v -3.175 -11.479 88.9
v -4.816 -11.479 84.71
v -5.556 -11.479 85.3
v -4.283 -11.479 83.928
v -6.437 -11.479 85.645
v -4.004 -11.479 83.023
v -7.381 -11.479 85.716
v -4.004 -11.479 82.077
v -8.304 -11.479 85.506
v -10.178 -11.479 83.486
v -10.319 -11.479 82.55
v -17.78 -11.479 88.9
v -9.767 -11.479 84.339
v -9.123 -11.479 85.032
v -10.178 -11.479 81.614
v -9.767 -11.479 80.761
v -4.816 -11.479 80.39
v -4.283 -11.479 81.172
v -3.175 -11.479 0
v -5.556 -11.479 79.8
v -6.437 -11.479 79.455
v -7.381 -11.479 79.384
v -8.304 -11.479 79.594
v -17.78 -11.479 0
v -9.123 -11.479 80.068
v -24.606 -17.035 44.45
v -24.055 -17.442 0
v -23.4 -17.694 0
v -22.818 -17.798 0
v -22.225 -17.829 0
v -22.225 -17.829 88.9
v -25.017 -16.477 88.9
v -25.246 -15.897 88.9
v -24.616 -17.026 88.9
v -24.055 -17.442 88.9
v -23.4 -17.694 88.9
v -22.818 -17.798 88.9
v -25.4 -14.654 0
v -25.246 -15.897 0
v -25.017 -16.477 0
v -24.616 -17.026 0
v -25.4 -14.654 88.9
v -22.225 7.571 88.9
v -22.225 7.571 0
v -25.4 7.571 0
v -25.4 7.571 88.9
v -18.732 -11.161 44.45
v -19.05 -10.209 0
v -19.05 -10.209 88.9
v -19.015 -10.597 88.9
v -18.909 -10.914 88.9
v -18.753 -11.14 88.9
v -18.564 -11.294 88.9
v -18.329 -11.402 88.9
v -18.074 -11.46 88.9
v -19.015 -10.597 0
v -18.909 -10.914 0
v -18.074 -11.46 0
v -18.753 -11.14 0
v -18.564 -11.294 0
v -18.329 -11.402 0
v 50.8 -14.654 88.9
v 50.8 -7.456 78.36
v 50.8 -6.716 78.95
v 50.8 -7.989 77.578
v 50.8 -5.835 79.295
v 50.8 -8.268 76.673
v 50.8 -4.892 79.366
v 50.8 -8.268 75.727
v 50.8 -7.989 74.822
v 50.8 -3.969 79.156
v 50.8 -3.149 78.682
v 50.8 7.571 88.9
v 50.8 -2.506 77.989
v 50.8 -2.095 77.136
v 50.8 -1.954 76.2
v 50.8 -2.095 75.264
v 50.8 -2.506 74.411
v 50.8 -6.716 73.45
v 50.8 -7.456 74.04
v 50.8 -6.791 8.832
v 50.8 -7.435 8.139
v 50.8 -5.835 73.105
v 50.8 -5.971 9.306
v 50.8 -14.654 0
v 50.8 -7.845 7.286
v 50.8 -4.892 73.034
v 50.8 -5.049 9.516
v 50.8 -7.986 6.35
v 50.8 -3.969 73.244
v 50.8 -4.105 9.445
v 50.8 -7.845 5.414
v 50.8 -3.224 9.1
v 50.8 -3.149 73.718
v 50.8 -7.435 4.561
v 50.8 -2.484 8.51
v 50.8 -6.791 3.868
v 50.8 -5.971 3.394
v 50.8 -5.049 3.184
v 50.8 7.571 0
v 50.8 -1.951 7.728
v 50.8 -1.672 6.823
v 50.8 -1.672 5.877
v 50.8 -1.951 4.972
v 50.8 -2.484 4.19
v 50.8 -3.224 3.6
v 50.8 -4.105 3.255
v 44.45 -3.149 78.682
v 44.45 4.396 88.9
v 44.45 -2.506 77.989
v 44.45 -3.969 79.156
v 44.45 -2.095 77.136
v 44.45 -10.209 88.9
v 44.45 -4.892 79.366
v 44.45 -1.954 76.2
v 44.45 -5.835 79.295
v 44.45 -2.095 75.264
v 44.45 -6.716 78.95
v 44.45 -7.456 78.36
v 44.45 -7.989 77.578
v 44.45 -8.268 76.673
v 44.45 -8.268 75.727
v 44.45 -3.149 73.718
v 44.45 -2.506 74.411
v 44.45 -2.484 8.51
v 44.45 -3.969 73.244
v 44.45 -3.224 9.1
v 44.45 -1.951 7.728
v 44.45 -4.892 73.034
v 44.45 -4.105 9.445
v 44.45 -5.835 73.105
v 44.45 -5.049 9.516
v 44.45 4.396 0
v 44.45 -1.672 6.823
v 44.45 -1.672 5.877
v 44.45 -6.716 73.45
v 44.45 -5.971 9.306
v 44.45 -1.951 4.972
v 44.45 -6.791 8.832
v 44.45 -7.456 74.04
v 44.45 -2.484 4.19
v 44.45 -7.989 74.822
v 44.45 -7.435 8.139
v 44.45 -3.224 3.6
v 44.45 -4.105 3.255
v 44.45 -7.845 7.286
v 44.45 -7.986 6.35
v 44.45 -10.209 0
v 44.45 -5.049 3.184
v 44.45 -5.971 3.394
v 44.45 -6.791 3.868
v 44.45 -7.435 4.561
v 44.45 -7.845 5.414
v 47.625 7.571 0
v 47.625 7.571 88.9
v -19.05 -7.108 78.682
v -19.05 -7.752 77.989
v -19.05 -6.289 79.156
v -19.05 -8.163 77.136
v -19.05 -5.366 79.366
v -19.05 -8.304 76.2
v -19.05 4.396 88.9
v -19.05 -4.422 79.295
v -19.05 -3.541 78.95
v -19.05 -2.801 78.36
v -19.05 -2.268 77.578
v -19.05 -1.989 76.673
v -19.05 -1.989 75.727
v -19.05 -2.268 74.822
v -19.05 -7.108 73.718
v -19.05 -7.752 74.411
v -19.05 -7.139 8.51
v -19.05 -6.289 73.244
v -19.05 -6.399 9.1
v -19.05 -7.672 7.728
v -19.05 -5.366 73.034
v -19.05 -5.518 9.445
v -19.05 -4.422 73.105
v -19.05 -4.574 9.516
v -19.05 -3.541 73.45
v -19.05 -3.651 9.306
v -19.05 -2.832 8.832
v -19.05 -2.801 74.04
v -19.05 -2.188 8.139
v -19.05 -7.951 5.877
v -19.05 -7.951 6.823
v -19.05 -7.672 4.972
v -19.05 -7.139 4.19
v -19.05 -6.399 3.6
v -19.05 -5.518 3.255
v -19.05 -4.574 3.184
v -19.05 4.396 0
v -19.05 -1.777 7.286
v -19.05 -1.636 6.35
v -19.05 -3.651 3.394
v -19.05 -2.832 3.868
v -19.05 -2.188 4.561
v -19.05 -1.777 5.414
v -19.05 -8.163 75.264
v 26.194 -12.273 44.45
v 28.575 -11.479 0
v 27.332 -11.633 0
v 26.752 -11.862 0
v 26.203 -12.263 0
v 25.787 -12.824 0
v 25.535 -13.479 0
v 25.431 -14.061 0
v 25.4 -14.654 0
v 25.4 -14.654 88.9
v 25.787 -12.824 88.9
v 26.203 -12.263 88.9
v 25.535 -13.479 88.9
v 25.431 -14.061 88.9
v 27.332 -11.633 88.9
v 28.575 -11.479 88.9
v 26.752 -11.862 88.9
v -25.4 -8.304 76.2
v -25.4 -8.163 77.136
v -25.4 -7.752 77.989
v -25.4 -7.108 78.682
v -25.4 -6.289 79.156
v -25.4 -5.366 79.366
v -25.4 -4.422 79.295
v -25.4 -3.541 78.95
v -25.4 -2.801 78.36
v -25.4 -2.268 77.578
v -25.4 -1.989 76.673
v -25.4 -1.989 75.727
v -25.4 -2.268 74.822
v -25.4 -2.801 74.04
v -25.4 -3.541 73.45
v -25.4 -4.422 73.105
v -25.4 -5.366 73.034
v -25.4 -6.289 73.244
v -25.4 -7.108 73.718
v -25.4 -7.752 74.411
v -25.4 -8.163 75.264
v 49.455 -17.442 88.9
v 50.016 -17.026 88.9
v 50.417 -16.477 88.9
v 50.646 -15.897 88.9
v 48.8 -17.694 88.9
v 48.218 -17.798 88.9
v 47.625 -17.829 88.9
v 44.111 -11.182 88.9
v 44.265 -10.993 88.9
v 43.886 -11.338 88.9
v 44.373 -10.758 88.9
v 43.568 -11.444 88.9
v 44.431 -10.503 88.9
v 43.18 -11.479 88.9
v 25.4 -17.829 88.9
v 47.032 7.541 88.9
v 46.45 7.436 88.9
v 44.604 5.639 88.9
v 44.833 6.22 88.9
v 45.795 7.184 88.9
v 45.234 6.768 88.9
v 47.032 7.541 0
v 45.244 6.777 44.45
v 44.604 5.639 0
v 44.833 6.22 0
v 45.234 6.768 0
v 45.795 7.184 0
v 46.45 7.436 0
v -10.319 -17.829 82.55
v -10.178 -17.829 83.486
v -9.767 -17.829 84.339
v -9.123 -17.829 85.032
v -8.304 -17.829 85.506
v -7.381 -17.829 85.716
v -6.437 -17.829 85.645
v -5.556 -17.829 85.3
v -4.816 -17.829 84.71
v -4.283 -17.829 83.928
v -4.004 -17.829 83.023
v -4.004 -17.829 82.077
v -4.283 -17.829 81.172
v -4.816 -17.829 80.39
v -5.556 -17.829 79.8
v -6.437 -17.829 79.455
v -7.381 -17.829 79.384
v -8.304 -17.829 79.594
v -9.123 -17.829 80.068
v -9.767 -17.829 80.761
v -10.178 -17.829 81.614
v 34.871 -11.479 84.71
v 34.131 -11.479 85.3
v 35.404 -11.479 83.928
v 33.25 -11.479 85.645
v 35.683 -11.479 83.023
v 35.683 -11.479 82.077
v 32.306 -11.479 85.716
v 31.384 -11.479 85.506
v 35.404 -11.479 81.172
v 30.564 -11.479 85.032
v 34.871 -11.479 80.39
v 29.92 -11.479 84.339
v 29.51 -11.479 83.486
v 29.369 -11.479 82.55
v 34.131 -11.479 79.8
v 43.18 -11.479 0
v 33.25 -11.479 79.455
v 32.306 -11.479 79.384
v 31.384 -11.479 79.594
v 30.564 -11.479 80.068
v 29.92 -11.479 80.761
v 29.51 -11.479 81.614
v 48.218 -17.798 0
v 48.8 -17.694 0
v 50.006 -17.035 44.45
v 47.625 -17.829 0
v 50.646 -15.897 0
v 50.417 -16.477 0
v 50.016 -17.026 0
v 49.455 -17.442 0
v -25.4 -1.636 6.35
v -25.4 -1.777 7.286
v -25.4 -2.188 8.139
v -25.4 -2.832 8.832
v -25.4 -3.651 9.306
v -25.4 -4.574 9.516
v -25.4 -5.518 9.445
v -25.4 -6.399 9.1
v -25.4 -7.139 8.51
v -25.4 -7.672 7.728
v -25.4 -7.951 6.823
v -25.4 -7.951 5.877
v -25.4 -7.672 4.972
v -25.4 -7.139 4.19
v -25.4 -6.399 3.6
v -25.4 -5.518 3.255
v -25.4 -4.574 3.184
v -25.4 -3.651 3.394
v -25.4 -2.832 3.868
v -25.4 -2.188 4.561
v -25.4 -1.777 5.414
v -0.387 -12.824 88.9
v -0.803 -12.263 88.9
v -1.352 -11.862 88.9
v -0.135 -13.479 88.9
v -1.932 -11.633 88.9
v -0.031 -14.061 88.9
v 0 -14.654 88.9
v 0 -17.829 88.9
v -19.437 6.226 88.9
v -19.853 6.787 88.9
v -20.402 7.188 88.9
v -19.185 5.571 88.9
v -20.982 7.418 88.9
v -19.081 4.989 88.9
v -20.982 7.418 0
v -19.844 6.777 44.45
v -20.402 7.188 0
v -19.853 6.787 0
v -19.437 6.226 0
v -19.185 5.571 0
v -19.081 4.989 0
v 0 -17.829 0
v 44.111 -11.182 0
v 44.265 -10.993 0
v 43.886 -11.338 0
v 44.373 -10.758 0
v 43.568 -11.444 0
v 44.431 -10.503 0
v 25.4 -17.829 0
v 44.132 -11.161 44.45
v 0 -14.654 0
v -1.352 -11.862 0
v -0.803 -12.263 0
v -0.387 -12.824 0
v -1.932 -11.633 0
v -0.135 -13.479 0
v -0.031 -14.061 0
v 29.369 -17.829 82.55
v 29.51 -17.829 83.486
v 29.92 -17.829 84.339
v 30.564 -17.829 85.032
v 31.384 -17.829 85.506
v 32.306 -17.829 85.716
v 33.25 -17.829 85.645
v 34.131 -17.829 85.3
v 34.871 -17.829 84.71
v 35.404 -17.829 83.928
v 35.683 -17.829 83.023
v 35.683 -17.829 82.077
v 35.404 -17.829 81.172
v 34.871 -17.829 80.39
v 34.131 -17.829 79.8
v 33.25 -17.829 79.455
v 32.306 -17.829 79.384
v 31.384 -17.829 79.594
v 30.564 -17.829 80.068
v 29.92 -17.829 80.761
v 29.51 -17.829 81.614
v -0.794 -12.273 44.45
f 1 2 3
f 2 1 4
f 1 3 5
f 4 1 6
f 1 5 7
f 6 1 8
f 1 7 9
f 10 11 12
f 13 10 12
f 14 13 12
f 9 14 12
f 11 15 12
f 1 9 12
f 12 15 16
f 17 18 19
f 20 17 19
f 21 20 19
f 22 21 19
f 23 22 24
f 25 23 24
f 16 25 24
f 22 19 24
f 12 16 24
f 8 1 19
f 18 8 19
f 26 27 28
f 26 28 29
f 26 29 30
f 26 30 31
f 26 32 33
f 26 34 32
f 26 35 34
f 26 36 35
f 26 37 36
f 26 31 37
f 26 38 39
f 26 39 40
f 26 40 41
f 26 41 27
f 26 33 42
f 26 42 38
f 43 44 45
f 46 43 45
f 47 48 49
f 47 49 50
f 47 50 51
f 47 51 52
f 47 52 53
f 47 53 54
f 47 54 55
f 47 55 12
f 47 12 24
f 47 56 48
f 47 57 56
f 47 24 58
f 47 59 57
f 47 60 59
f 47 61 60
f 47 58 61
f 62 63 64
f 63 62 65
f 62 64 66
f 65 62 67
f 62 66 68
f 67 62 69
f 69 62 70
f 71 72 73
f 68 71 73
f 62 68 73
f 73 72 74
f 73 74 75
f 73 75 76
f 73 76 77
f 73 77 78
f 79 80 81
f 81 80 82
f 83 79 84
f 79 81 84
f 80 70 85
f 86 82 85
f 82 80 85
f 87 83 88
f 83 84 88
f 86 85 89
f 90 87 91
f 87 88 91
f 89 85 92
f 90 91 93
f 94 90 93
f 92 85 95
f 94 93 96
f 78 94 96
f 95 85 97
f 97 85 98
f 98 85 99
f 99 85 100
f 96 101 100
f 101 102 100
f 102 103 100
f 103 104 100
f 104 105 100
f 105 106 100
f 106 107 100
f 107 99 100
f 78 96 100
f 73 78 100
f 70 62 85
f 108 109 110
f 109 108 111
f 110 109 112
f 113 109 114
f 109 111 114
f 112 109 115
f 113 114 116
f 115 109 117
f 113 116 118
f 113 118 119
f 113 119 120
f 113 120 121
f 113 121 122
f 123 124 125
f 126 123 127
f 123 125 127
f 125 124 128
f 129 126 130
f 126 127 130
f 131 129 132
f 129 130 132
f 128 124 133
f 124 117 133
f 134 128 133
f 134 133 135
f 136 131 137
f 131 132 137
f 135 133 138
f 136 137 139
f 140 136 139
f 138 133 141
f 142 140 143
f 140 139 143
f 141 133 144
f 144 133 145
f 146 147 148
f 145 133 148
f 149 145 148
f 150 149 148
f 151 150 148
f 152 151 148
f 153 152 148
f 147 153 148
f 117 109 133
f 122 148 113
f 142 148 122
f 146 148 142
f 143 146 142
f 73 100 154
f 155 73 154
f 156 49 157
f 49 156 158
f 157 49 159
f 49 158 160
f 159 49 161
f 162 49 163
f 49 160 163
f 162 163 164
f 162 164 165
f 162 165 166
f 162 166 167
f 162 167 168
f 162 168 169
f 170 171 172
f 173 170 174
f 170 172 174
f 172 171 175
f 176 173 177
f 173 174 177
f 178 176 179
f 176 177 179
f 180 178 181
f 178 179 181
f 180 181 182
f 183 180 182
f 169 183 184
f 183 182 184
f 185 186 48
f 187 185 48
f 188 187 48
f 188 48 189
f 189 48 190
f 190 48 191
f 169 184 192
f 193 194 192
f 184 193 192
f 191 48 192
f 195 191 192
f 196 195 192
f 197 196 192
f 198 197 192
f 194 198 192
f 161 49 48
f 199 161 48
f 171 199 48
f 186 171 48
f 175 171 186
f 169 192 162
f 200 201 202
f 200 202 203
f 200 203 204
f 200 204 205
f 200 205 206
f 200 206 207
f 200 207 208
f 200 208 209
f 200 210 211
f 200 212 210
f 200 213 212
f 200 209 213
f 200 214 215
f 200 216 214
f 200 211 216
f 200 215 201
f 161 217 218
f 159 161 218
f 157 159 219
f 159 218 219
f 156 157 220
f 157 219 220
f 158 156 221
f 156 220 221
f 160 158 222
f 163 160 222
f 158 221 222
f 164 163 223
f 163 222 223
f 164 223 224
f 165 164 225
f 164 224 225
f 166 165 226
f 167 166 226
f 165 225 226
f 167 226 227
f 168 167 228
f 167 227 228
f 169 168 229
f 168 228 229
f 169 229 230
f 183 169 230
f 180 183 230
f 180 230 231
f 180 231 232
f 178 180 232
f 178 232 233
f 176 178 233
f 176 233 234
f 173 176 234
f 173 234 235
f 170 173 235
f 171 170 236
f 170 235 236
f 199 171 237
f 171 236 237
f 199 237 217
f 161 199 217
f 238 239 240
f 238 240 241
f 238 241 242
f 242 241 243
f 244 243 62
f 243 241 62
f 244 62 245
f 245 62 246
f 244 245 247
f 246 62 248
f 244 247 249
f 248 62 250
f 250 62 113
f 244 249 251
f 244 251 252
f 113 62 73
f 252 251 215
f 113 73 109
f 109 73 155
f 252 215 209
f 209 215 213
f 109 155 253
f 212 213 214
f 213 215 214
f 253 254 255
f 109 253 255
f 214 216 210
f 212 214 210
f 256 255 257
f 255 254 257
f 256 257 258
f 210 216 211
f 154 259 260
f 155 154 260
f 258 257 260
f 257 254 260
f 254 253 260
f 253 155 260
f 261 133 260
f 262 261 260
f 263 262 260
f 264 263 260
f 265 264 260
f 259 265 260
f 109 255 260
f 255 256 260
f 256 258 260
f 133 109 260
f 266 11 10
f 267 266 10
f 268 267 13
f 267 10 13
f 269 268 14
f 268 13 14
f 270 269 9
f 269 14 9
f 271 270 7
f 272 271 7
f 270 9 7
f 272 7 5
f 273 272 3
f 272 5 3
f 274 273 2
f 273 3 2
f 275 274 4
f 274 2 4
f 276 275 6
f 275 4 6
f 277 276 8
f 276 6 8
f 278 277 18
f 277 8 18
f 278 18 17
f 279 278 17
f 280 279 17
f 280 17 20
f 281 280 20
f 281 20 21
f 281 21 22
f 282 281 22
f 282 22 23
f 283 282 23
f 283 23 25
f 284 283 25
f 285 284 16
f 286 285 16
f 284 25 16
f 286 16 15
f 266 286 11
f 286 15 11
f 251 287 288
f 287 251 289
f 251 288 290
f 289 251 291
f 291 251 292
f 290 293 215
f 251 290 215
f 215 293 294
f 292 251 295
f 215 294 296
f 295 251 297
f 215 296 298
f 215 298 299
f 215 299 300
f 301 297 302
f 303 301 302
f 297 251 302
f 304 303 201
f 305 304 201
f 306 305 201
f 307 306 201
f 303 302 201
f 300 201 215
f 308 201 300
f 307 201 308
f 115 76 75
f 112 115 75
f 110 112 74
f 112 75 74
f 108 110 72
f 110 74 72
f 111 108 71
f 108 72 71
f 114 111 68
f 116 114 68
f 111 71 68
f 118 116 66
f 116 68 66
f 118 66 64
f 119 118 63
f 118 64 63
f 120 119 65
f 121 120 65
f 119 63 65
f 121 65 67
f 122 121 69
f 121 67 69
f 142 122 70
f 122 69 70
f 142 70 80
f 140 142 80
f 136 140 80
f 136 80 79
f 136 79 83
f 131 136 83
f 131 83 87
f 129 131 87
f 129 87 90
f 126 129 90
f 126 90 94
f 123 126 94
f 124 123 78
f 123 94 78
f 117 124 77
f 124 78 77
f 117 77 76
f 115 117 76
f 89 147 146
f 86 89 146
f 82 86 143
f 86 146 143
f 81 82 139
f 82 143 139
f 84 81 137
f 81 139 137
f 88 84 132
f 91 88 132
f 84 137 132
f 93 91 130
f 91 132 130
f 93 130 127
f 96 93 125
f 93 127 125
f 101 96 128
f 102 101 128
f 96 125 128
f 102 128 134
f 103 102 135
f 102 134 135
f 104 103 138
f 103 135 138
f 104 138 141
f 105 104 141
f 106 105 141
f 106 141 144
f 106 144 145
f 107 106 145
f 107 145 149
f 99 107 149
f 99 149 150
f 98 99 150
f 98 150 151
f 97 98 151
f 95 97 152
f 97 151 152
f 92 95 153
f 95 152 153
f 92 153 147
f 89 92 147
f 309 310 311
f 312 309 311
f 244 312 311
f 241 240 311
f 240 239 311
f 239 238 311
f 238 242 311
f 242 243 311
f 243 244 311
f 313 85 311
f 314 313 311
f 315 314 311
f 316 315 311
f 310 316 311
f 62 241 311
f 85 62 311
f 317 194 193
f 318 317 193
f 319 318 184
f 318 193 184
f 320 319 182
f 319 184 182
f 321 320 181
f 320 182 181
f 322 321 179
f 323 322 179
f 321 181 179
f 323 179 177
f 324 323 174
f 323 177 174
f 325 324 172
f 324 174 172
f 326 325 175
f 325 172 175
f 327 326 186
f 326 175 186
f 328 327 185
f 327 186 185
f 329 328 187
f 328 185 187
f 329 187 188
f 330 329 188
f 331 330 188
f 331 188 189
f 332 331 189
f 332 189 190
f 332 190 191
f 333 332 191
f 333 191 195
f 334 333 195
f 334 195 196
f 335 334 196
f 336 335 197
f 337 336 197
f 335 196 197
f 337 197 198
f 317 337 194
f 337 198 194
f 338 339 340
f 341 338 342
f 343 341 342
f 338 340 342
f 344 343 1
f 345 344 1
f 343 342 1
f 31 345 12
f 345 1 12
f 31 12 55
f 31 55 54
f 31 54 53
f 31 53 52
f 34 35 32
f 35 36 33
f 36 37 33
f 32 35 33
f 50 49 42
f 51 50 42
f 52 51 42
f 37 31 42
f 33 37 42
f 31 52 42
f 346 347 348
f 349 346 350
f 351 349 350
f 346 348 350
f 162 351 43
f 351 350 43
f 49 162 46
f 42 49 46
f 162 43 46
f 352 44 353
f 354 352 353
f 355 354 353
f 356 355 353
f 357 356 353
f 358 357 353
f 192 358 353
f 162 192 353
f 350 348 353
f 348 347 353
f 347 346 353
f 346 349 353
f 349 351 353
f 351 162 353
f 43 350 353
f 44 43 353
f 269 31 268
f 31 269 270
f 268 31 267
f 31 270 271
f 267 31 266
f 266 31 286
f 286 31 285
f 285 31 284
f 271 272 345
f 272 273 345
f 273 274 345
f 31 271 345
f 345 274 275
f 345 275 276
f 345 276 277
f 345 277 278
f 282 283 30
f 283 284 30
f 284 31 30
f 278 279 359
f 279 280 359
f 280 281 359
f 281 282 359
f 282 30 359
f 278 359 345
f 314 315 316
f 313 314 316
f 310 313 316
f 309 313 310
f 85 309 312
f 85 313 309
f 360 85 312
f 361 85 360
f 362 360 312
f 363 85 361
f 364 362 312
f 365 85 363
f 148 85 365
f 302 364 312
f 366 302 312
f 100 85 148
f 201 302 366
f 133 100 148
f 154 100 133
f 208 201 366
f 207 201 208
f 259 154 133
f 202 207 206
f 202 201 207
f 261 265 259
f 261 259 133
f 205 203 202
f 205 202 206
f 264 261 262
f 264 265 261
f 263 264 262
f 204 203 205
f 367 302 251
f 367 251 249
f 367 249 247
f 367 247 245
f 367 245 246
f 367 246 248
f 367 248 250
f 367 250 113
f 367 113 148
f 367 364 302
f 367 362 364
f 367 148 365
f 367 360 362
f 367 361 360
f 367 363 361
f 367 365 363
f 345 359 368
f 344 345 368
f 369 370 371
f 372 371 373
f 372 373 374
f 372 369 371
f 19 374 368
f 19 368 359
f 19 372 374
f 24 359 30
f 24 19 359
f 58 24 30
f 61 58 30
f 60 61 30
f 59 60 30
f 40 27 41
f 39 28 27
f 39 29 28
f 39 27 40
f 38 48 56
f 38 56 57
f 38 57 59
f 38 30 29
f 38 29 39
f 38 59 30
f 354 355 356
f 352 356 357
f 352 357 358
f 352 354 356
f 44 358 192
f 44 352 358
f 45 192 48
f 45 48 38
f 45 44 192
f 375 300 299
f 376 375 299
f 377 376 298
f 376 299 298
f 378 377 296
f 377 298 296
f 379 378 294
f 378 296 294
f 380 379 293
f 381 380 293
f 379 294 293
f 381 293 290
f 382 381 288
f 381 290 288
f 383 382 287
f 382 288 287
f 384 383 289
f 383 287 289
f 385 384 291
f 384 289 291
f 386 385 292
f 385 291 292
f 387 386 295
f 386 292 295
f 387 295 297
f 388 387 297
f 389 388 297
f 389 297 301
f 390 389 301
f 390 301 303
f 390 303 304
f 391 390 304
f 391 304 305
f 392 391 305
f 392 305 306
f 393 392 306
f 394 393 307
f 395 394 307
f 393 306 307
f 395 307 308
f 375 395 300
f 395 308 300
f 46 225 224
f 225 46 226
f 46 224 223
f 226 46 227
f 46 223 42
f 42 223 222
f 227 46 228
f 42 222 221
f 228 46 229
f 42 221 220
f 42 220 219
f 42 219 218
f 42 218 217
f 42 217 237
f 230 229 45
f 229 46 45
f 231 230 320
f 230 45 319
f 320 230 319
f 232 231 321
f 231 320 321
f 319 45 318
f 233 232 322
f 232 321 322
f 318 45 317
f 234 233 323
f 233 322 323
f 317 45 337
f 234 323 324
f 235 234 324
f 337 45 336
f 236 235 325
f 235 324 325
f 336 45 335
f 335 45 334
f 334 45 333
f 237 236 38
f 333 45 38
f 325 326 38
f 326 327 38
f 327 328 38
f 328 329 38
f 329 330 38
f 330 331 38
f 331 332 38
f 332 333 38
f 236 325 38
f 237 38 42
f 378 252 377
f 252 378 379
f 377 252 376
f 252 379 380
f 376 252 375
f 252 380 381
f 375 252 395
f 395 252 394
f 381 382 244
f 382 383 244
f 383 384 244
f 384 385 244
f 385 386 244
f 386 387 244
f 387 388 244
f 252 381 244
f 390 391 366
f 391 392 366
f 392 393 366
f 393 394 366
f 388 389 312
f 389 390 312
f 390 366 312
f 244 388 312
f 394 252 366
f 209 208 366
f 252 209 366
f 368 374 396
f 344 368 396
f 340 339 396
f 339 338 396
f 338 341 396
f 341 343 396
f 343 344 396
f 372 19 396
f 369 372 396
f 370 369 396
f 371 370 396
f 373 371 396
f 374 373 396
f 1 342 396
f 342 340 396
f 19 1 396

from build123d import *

# Parameters (mm, degrees)
F1_DEPTH      = 88.9
F2_T1_DEPTH   = 104.775
F3_T1_DEPTH   = 104.775
F5_DEPTH      = 88.9
F6_T1_DEPTH   = 104.775
F7_T1_DEPTH   = 88.9
F7_2_T1_DEPTH = 88.9
F8_T1_DEPTH   = 104.775
F10_R         = 3.175
F11_DEPTH     = 6.35
F9_R          = 3.175
F12_DEPTH     = 6.35
F14_R         = 3.175
F15_DEPTH     = 6.35
F13_R         = 3.175
F16_DEPTH     = 6.35
F17_R         = 3.175
F19_DEPTH     = 6.35
F18_R         = 3.175
F20_DEPTH     = 6.35


# Not quite as in the source:
# - a fillet or chamfer that OpenCascade refuses, or shapes differently, is made with other operations: its cross-section is extruded or revolved along the edge and cut away or added


with BuildPart() as f1:
    # F0 (on Top) → F1 (new body)
    with BuildSketch(Plane.XY):
        Polygon((-19.05, -11.4788501549), (-19.05, 7.5711498451), (-25.4, 7.5711498451), (-25.4, -17.8288501549), (0, -17.8288501549), (0, -11.4788501549), align=None)
    extrude(amount=F1_DEPTH)

    # F2: fillet of radius 3.175 on 2 edges, made by hand

    # F2_s2 → F2_t1 (cut)
    with BuildSketch(Plane.XY.offset(-7.9375)):
        with BuildLine():
            add(Edge.make_bspline(
                [(-19.05, 4.3961498451), (-19.05, 7.5711498451), (-22.225, 7.5711498451)],
                knots=[0, 0, 0, 1, 1, 1], degree=2, weights=[1, 1, 1]))
            Line((-22.225, 7.5711498451), (-19.05, 7.5711498451))
            Line((-19.05, 7.5711498451), (-19.05, 4.3961498451))
        make_face()
        with BuildLine():
            add(Edge.make_bspline(
                [(0, -14.6538501549), (0, -11.4788501549), (-3.175, -11.4788501549)],
                knots=[0, 0, 0, 1, 1, 1], degree=2, weights=[1, 1, 1]))
            Line((-3.175, -11.4788501549), (0, -11.4788501549))
            Line((0, -11.4788501549), (0, -14.6538501549))
        make_face()
    extrude(amount=F2_T1_DEPTH, mode=Mode.SUBTRACT)

    # F3: fillet of radius 3.175 on 1 edges, made by hand

    # F3_s2 → F3_t1 (cut)
    with BuildSketch(Plane.XY.offset(-7.9375)):
        with BuildLine():
            add(Edge.make_bspline(
                [(-22.225, -17.8288501549), (-25.4, -17.8288501549), (-25.4, -14.6538501549)],
                knots=[0, 0, 0, 1, 1, 1], degree=2, weights=[1, 1, 1]))
            Line((-25.4, -14.6538501549), (-25.4, -17.8288501549))
            Line((-25.4, -17.8288501549), (-22.225, -17.8288501549))
        make_face()
    extrude(amount=F3_T1_DEPTH, mode=Mode.SUBTRACT)

    # F7#2: fillet of radius 1.27 on 1 edges, made by hand

    # F7_2_s2 → F7_2_t1 (join)
    with BuildSketch(Plane.XY):
        with BuildLine():
            add(Edge.make_bspline(
                [(-19.05, -10.2088501549), (-19.05, -11.4788501549), (-17.78, -11.4788501549)],
                knots=[0, 0, 0, 1, 1, 1], degree=2, weights=[1, 1, 1]))
            Line((-17.78, -11.4788501549), (-19.05, -11.4788501549))
            Line((-19.05, -11.4788501549), (-19.05, -10.2088501549))
        make_face()
    extrude(amount=F7_2_T1_DEPTH)

    # F9 (on face) → F12 (cut)
    with BuildSketch(Plane.YZ.offset(-19.05)):
        with Locations((-4.8113501549, 6.35)):
            Circle(F9_R)
    extrude(amount=-F12_DEPTH, mode=Mode.SUBTRACT)

    # F14 (on face) → F15 (cut)
    with BuildSketch(Plane(origin=(-25.4, 0, 0), x_dir=(0, -1, 0), z_dir=(-1, 0, 0))):
        with Locations((5.1288501549, 76.2)):
            Circle(F14_R)
    extrude(amount=-F15_DEPTH, mode=Mode.SUBTRACT)

    # F18 (on face) → F20 (cut)
    with BuildSketch(Plane(origin=(0, -11.4788501549, 0), x_dir=(-1, 0, 0), z_dir=(0, 1, 0))):
        with Locations((7.14375, 82.55)):
            Circle(F18_R)
    extrude(amount=-F20_DEPTH, mode=Mode.SUBTRACT)


with BuildPart() as f5:
    # F4 (on Top) → F5 (new body)
    with BuildSketch(Plane.XY):
        Polygon((25.4, -11.4788501549), (25.4, -17.8288501549), (50.8, -17.8288501549), (50.8, 7.5711498451), (44.45, 7.5711498451), (44.45, -11.4788501549), align=None)
    extrude(amount=F5_DEPTH)

    # F6: fillet of radius 3.175 on 2 edges, made by hand

    # F6_s2 → F6_t1 (cut)
    with BuildSketch(Plane.XY.offset(-7.9375)):
        with BuildLine():
            add(Edge.make_bspline(
                [(25.4, -14.6538501549), (25.4, -11.4788501549), (28.575, -11.4788501549)],
                knots=[0, 0, 0, 1, 1, 1], degree=2, weights=[1, 1, 1]))
            Line((28.575, -11.4788501549), (25.4, -11.4788501549))
            Line((25.4, -11.4788501549), (25.4, -14.6538501549))
        make_face()
        with BuildLine():
            add(Edge.make_bspline(
                [(47.625, 7.5711498451), (44.45, 7.5711498451), (44.45, 4.3961498451)],
                knots=[0, 0, 0, 1, 1, 1], degree=2, weights=[1, 1, 1]))
            Line((44.45, 4.3961498451), (44.45, 7.5711498451))
            Line((44.45, 7.5711498451), (47.625, 7.5711498451))
        make_face()
    extrude(amount=F6_T1_DEPTH, mode=Mode.SUBTRACT)

    # F7: fillet of radius 1.27 on 1 edges, made by hand

    # F7_s2 → F7_t1 (join)
    with BuildSketch(Plane.XY):
        with BuildLine():
            add(Edge.make_bspline(
                [(43.18, -11.4788501549), (44.45, -11.4788501549), (44.45, -10.2088501549)],
                knots=[0, 0, 0, 1, 1, 1], degree=2, weights=[1, 1, 1]))
            Line((44.45, -10.2088501549), (44.45, -11.4788501549))
            Line((44.45, -11.4788501549), (43.18, -11.4788501549))
        make_face()
    extrude(amount=F7_T1_DEPTH)

    # F8: fillet of radius 3.175 on 1 edges, made by hand

    # F8_s2 → F8_t1 (cut)
    with BuildSketch(Plane.XY.offset(-7.9375)):
        with BuildLine():
            add(Edge.make_bspline(
                [(47.625, -17.8288501549), (50.8, -17.8288501549), (50.8, -14.6538501549)],
                knots=[0, 0, 0, 1, 1, 1], degree=2, weights=[1, 1, 1]))
            Line((50.8, -14.6538501549), (50.8, -17.8288501549))
            Line((50.8, -17.8288501549), (47.625, -17.8288501549))
        make_face()
    extrude(amount=F8_T1_DEPTH, mode=Mode.SUBTRACT)

    # F10 (on face) → F11 (cut)
    with BuildSketch(Plane(origin=(44.45, 0, 0), x_dir=(0, -1, 0), z_dir=(-1, 0, 0))):
        with Locations((4.8113501549, 6.35)):
            Circle(F10_R)
    extrude(amount=-F11_DEPTH, mode=Mode.SUBTRACT)

    # F13 (on face) → F16 (cut)
    with BuildSketch(Plane.YZ.offset(50.8)):
        with Locations((-5.1288501549, 76.2)):
            Circle(F13_R)
    extrude(amount=-F16_DEPTH, mode=Mode.SUBTRACT)

    # F17 (on face) → F19 (cut)
    with BuildSketch(Plane(origin=(0, -11.4788501549, 0), x_dir=(-1, 0, 0), z_dir=(0, 1, 0))):
        with Locations((-32.54375, 82.55)):
            Circle(F17_R)
    extrude(amount=-F19_DEPTH, mode=Mode.SUBTRACT)


solid = Compound([f1.part, f5.part])
